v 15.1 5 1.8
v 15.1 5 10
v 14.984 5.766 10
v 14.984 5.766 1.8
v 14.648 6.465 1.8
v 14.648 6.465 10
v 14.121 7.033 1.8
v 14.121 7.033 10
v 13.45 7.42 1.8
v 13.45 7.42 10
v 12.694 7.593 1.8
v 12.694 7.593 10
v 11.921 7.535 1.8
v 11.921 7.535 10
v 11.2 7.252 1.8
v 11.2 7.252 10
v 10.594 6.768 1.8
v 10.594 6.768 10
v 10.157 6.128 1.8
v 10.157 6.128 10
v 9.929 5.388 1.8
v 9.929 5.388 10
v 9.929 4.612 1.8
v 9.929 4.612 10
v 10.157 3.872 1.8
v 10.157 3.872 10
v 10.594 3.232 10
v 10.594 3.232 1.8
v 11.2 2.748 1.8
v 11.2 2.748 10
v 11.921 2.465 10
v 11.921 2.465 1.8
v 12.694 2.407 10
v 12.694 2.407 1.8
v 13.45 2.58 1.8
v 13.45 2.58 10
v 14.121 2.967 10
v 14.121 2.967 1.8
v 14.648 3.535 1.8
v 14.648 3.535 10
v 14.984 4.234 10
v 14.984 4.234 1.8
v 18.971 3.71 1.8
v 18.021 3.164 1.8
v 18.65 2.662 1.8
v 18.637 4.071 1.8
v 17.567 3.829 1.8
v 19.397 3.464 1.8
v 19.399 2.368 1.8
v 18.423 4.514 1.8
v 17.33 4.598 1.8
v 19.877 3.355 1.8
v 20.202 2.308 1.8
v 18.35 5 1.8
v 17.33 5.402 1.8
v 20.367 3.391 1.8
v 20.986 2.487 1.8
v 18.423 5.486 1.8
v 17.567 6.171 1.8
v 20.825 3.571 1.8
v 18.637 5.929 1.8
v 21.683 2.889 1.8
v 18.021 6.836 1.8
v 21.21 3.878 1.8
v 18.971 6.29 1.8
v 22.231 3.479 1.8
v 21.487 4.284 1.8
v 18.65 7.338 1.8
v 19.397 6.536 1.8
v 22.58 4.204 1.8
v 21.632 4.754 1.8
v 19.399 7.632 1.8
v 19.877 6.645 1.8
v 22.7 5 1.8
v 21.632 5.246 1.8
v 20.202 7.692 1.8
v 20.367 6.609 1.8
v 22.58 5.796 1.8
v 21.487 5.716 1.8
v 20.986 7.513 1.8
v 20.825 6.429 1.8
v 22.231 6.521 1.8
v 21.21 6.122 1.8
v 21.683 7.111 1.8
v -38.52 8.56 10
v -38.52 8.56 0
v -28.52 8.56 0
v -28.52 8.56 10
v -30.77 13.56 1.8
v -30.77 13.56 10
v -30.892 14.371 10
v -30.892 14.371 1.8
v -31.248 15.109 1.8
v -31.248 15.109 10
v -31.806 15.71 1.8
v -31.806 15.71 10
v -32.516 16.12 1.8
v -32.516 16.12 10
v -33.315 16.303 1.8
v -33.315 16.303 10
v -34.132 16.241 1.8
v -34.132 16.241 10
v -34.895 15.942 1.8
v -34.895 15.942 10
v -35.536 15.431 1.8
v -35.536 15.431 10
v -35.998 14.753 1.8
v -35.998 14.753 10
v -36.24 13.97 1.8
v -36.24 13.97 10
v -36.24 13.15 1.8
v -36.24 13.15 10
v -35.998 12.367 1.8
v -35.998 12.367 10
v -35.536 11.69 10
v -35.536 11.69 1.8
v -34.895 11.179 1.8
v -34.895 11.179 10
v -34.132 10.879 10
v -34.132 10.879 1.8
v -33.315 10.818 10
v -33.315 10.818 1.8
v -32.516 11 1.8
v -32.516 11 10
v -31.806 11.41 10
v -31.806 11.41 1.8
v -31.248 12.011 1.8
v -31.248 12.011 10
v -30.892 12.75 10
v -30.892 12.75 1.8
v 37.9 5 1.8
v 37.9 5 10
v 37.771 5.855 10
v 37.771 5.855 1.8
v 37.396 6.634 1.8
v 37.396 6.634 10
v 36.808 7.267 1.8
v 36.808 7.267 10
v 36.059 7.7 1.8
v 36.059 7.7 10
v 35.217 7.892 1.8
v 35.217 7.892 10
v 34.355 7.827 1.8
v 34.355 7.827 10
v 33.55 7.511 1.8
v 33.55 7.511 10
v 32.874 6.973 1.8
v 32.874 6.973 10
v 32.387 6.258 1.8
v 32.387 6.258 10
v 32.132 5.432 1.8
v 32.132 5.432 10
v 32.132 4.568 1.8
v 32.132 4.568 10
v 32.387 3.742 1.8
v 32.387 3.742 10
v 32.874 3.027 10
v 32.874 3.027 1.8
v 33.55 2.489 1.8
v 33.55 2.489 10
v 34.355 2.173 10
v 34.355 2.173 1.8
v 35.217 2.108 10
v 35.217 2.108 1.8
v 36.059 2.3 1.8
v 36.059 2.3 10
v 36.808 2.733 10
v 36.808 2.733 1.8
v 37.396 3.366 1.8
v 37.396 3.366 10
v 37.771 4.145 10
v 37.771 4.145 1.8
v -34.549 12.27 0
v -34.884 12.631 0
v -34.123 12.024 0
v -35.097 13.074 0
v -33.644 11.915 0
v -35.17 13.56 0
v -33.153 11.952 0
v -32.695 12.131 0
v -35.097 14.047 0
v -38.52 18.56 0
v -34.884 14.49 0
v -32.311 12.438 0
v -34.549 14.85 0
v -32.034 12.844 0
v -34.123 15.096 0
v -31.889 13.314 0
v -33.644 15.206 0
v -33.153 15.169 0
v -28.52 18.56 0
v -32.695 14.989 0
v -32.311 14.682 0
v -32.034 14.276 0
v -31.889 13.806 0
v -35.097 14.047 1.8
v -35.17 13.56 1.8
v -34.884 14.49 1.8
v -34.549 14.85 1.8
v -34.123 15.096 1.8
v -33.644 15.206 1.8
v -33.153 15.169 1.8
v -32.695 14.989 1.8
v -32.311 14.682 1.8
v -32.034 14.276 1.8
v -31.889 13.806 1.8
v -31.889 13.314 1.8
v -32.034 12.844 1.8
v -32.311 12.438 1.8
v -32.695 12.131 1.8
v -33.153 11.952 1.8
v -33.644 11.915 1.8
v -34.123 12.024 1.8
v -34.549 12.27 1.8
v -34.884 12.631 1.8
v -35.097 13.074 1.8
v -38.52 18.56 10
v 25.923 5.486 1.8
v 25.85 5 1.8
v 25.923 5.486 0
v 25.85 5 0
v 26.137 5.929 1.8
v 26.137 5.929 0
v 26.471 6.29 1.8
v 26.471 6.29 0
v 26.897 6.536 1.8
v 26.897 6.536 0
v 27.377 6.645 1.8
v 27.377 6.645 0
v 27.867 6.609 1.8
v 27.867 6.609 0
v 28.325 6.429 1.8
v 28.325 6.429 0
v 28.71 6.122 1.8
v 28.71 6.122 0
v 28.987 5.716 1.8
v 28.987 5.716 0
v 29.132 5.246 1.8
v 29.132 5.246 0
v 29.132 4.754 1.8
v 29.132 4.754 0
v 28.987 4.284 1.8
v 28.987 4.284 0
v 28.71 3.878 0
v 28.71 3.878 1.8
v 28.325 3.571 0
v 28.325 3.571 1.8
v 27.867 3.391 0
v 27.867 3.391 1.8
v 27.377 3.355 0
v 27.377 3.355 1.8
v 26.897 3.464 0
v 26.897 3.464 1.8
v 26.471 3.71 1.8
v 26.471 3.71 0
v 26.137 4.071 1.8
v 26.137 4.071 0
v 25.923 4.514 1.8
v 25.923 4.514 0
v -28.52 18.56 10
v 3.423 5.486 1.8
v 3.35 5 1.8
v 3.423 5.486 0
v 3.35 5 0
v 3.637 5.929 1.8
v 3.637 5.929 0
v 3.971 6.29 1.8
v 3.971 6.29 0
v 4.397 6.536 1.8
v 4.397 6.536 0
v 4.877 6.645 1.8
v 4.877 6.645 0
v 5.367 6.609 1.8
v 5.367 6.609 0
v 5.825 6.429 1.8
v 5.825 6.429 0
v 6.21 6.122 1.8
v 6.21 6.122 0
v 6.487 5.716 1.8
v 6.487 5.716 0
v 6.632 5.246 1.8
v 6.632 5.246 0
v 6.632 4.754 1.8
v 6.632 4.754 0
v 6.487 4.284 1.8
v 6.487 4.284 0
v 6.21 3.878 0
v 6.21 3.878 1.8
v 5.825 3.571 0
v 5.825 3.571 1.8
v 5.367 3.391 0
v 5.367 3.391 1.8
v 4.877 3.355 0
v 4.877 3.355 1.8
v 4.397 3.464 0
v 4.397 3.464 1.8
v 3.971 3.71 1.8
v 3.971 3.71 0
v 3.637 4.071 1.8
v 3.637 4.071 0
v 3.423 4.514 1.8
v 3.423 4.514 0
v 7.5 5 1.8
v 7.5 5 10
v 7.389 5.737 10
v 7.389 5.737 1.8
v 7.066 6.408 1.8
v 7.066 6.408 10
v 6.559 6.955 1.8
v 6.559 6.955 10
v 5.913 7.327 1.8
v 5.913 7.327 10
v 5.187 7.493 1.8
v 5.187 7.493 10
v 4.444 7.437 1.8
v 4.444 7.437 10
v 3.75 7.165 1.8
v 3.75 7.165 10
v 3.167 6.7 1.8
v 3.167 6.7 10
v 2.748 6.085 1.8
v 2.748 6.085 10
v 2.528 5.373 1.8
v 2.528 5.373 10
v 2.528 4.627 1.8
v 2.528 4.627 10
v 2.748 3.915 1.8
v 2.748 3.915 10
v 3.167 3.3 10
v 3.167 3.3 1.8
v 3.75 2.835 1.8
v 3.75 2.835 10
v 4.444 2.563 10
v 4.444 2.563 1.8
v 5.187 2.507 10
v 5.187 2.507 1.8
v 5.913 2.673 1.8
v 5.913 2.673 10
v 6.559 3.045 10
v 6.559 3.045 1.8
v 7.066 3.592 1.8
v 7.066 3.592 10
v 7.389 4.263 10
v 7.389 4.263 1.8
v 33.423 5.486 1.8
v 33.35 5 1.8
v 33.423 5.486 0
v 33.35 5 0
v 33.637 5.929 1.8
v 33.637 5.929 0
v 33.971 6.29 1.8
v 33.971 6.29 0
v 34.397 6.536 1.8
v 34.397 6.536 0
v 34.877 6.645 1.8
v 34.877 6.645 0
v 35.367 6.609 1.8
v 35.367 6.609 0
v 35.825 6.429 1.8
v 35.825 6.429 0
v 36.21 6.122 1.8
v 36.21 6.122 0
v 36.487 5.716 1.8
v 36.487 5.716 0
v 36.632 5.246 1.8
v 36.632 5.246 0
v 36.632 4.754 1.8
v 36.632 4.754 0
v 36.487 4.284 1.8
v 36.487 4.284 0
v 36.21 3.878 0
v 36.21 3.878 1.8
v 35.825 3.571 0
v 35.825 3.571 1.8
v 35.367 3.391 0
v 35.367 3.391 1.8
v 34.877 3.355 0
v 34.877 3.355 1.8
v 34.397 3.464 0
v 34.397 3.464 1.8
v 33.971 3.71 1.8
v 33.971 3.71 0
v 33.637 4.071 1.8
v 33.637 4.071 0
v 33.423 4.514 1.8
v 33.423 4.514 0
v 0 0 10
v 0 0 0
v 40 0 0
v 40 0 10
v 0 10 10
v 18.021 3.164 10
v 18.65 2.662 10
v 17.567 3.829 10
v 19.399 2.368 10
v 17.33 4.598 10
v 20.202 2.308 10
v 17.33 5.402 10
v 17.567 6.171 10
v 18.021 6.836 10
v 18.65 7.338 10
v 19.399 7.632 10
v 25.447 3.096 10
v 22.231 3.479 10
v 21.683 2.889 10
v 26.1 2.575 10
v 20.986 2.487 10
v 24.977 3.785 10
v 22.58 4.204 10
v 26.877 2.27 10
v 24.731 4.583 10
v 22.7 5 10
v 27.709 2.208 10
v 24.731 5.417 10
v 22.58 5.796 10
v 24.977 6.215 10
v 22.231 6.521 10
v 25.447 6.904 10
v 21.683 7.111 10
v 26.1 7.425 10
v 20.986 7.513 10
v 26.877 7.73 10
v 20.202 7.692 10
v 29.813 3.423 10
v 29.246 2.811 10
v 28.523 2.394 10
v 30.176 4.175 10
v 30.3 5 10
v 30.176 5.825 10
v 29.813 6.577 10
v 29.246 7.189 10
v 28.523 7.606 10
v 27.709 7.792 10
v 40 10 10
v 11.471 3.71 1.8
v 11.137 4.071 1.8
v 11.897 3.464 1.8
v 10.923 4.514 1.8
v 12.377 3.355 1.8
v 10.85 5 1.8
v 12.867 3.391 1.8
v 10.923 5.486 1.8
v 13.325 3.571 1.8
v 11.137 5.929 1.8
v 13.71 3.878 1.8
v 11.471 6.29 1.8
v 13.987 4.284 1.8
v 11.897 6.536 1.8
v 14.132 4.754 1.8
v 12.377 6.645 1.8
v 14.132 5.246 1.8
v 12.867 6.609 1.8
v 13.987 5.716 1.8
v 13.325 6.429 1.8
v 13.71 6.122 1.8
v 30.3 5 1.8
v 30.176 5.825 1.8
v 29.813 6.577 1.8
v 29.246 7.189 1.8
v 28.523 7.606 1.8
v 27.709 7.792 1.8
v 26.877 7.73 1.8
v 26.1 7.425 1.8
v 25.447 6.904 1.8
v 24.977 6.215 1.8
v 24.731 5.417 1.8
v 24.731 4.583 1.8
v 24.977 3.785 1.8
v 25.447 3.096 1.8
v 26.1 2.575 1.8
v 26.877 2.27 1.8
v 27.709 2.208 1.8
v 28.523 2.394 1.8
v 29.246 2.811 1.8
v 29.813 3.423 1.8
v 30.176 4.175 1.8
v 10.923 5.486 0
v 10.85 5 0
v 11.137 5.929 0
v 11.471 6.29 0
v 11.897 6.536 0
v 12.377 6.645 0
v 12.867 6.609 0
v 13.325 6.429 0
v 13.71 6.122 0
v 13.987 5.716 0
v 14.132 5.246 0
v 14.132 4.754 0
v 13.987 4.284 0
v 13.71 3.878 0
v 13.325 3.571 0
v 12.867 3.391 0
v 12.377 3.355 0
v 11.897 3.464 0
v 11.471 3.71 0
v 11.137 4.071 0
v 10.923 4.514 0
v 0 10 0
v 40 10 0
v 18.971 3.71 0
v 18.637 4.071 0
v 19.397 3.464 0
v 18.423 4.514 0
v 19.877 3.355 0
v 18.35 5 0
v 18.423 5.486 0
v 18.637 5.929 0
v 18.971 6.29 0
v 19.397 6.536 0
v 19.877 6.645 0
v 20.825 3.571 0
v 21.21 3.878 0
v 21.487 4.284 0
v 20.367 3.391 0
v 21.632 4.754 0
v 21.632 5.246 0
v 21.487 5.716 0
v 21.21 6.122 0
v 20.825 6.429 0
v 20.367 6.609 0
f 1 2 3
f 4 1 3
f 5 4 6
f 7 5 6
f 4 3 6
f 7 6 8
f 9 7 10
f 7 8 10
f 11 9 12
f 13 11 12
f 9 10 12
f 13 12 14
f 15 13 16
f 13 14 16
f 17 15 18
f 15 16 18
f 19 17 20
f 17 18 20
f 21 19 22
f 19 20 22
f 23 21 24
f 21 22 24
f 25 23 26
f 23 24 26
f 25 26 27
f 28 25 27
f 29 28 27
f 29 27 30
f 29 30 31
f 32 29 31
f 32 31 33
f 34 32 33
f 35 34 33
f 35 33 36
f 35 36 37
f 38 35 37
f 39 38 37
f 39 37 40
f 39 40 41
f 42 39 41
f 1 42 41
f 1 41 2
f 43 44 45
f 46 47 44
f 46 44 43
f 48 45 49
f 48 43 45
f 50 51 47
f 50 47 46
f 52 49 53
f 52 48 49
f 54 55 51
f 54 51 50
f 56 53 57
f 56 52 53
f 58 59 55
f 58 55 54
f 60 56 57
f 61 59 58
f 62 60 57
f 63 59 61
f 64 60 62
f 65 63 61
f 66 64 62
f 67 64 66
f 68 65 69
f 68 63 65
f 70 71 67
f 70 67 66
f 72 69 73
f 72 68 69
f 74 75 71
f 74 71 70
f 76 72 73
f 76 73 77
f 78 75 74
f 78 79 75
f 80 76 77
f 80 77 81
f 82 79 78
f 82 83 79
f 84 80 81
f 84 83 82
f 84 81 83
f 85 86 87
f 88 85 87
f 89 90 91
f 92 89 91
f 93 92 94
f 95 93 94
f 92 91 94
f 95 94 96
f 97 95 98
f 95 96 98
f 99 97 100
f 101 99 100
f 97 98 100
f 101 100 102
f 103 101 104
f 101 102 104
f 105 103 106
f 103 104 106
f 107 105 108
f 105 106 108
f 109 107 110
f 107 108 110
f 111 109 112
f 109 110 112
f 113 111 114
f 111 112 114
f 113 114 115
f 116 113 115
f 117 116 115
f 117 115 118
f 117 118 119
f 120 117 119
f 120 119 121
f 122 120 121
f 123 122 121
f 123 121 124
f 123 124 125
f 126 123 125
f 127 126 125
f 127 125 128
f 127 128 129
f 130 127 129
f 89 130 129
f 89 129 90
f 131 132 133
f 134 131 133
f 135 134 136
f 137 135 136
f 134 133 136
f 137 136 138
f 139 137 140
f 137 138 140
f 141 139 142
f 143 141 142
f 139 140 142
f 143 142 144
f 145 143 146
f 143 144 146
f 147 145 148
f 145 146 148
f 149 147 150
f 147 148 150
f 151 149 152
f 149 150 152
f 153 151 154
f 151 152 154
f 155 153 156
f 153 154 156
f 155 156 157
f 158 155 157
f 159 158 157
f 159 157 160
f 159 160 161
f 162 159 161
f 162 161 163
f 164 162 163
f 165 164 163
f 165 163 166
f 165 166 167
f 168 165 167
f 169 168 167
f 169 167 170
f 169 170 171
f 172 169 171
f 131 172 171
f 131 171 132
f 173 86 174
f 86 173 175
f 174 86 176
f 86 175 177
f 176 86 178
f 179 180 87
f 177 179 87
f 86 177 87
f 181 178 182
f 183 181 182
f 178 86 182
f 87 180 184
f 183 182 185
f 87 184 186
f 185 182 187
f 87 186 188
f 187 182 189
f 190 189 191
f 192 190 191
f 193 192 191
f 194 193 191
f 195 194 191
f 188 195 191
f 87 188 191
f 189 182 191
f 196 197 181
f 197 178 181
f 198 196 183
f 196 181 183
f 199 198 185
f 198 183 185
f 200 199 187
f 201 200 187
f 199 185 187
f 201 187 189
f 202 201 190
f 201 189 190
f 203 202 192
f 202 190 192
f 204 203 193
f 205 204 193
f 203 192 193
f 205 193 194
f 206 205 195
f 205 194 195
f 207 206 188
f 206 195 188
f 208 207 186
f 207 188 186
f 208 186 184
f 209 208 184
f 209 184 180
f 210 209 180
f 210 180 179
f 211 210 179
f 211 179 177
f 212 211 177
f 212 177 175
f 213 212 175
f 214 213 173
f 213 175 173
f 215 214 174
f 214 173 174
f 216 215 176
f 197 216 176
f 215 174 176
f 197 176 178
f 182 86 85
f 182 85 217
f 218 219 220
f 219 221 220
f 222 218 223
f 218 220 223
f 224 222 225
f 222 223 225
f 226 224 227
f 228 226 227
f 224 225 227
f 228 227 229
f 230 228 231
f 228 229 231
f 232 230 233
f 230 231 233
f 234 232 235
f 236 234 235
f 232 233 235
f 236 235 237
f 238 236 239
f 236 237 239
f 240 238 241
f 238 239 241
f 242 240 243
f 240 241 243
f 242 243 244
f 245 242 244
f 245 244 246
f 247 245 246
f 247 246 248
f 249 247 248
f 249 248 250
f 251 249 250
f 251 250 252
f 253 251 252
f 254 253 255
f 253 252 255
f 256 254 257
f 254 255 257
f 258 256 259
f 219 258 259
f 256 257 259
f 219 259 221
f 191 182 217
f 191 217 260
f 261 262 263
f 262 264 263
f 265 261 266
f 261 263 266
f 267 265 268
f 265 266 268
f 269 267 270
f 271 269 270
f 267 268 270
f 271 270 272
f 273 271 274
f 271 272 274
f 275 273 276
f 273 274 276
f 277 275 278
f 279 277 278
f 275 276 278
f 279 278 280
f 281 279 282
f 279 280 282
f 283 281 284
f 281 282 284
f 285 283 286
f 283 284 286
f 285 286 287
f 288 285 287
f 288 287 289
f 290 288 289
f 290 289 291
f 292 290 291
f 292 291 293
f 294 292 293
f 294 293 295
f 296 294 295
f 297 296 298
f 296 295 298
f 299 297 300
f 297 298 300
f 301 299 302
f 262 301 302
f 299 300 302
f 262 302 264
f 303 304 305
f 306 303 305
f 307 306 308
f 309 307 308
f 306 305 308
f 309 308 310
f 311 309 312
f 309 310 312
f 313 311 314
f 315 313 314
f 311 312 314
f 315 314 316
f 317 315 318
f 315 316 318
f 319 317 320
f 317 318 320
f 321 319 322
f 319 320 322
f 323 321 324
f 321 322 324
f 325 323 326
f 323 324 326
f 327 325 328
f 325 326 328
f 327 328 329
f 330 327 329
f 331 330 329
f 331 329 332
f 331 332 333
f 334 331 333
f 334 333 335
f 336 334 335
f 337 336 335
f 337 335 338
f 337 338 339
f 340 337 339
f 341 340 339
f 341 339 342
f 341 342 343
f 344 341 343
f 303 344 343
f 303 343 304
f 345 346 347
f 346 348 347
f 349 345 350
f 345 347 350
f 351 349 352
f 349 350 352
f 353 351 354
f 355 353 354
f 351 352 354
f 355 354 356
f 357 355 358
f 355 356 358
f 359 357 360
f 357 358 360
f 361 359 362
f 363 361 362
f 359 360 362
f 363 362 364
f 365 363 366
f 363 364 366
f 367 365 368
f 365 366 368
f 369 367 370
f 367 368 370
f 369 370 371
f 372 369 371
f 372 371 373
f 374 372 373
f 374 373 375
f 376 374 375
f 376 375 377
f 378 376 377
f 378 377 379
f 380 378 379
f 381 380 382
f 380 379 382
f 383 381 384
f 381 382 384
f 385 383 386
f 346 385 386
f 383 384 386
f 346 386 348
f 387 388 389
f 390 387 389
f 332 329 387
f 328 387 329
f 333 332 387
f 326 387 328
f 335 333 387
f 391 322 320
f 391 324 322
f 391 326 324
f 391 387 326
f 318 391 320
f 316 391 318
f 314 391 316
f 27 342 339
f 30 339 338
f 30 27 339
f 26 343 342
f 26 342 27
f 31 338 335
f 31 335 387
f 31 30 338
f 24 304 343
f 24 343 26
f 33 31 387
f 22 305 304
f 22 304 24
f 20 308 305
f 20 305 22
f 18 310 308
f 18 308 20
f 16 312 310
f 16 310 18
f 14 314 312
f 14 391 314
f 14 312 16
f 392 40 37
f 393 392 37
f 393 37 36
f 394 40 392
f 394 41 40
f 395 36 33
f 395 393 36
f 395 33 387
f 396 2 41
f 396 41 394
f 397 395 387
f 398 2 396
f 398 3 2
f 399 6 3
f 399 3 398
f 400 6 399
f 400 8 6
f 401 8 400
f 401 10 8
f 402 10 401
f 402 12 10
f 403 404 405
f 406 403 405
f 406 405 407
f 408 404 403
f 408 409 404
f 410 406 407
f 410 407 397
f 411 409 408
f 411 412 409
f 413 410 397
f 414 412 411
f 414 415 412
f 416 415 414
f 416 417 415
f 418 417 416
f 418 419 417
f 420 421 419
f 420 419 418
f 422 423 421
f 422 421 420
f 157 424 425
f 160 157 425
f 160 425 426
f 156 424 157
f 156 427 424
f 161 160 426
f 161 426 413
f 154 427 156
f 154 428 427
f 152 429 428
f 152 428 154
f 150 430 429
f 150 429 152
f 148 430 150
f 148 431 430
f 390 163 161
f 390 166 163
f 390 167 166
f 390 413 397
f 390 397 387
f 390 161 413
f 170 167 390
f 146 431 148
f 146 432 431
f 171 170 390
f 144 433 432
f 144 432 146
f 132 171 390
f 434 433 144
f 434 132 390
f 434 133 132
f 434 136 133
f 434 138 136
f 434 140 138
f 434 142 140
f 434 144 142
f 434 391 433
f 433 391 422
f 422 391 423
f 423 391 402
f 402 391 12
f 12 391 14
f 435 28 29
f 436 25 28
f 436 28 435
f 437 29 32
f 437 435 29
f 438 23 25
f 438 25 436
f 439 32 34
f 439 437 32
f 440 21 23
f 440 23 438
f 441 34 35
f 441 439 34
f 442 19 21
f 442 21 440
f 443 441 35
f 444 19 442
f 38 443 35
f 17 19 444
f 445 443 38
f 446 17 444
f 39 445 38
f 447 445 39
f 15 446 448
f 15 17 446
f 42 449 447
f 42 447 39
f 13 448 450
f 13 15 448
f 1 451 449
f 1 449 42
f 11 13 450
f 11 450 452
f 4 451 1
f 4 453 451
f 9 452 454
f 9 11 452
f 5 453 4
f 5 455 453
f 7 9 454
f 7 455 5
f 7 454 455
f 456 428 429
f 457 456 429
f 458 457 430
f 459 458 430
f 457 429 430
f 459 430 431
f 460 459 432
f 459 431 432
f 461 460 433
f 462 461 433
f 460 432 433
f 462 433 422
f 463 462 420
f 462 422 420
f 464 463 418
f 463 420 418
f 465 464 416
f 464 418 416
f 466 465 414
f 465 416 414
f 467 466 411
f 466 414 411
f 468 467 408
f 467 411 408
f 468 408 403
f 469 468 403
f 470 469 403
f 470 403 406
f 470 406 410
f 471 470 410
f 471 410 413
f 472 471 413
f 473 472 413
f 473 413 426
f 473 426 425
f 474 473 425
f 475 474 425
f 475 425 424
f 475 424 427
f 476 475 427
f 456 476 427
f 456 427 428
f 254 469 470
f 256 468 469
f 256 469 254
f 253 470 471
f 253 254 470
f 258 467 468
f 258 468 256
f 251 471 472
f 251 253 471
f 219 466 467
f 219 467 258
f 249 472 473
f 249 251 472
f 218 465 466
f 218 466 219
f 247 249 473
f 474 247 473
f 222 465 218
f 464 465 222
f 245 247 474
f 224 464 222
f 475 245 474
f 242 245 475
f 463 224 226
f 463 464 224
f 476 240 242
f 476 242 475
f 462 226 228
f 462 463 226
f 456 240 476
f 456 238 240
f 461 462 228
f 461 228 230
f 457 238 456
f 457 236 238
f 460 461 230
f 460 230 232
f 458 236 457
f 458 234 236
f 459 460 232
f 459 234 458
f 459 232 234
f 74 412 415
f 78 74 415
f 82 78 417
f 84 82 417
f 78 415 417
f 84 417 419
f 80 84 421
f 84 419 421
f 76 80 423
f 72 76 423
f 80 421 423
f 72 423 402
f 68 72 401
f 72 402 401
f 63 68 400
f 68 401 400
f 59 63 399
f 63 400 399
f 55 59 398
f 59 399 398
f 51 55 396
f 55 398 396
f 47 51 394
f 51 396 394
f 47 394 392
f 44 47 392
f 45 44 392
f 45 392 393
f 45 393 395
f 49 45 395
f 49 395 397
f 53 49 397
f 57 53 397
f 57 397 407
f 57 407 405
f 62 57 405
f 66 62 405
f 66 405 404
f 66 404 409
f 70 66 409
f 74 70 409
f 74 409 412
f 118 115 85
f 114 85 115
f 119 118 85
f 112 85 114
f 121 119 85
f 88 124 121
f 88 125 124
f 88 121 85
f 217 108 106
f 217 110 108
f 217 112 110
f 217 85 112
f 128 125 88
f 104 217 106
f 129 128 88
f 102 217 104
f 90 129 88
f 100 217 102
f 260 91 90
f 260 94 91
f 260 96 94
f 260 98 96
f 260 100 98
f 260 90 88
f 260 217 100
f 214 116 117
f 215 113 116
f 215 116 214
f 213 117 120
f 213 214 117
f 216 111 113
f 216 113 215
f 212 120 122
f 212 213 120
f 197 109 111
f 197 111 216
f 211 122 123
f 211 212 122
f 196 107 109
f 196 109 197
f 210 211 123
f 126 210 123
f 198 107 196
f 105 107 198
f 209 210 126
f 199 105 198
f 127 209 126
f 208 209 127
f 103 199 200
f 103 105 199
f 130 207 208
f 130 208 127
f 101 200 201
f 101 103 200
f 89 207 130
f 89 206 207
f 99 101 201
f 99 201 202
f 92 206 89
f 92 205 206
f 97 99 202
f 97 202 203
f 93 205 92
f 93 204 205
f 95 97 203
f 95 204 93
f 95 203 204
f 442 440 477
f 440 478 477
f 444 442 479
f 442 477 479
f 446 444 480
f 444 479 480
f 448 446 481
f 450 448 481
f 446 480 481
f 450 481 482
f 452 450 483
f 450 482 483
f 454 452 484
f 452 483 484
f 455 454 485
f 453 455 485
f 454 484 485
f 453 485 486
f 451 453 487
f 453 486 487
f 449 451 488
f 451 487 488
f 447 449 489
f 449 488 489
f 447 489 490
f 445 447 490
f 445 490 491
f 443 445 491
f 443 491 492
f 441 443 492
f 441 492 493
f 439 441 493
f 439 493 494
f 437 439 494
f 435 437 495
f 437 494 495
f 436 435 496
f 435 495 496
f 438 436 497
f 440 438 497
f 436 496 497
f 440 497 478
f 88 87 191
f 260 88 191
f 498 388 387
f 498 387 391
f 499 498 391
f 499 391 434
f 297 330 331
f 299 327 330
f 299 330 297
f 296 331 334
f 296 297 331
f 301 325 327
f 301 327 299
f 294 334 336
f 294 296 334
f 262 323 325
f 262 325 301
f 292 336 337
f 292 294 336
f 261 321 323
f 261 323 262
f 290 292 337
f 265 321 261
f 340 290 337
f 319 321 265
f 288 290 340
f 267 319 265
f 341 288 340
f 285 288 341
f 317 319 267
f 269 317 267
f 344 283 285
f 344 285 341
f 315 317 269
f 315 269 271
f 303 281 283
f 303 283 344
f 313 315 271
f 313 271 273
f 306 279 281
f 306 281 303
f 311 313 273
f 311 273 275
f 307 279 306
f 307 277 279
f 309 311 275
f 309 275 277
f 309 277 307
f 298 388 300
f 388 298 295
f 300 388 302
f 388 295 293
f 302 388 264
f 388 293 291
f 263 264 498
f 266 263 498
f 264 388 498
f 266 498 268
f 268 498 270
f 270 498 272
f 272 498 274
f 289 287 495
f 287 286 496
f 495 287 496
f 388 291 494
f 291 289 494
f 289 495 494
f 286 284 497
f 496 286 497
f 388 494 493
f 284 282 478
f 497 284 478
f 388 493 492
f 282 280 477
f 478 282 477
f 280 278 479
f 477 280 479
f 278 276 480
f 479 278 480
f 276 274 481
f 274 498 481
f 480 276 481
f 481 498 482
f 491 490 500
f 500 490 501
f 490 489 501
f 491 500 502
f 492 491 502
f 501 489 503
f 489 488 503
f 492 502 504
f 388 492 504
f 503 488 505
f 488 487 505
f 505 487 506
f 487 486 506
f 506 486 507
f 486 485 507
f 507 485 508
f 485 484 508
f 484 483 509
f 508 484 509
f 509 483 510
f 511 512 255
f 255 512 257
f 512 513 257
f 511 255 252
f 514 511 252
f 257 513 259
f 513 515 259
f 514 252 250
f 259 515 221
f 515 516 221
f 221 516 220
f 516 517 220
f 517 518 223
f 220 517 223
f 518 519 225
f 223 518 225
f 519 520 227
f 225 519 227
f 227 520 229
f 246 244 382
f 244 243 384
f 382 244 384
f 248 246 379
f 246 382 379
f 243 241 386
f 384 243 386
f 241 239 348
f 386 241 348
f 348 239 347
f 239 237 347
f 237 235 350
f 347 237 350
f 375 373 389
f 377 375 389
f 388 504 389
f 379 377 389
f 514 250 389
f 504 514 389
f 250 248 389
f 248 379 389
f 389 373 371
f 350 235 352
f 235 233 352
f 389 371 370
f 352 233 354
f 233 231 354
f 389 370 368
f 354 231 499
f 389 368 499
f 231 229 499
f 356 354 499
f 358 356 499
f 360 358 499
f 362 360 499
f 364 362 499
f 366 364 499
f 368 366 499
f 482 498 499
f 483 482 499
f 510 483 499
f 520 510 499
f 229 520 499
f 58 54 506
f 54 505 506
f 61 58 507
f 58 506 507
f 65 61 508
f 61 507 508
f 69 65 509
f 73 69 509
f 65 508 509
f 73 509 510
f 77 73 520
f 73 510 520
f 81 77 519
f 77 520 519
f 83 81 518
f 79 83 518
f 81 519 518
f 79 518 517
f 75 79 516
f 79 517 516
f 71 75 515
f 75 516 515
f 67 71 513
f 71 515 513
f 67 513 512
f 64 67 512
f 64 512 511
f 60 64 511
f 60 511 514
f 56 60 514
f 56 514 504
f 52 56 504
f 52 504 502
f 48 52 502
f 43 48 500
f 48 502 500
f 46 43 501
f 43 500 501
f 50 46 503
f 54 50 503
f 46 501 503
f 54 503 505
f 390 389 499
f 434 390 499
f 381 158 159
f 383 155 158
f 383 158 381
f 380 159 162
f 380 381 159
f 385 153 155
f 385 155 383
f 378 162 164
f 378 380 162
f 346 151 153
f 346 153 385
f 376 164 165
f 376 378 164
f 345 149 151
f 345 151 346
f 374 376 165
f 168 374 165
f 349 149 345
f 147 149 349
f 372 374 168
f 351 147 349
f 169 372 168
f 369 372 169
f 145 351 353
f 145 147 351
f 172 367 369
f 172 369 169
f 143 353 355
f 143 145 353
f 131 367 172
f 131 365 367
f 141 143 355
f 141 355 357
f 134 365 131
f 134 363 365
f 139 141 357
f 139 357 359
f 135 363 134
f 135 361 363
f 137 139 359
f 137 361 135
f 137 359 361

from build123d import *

# Parameters (mm, degrees)
F0_W            = 40
F0_H            = 10
F1_DEPTH        = 10
F3_D            = 3.3
F3_CBORE_D      = 5
F3_CBORE_DEPTH  = 8.2
F4_D            = 3.3
F4_CBORE_D      = 5.2
F4_CBORE_DEPTH  = 8.2
F5_D            = 3.3
F5_CBORE_D      = 5.4
F5_CBORE_DEPTH  = 8.2
F6_D            = 3.3
F6_CBORE_D      = 5.6
F6_CBORE_DEPTH  = 8.2
F7_D            = 3.3
F7_CBORE_D      = 5.8
F7_CBORE_DEPTH  = 8.2
F8_W            = 10
F8_H            = 10
F9_DEPTH        = 10
F11_D           = 3.3
F11_CBORE_D     = 5.5
F11_CBORE_DEPTH = 8.2


with BuildPart() as f1:
    # F0 (on Top) → F1 (new body)
    with BuildSketch(Plane.XY):
        with Locations((20, 5)):
            Rectangle(F0_W, F0_H)
    extrude(amount=F1_DEPTH)

    # F3 (through all)
    with Locations(Plane.XY.offset(10)):
        with Locations((5, 5)):
            CounterBoreHole(F3_D / 2, F3_CBORE_D / 2, F3_CBORE_DEPTH)

    # F4 (through all)
    with Locations(Plane.XY.offset(10)):
        with Locations((12.5, 5)):
            CounterBoreHole(F4_D / 2, F4_CBORE_D / 2, F4_CBORE_DEPTH)

    # F5 (through all)
    with Locations(Plane.XY.offset(10)):
        with Locations((20, 5)):
            CounterBoreHole(F5_D / 2, F5_CBORE_D / 2, F5_CBORE_DEPTH)

    # F6 (through all)
    with Locations(Plane.XY.offset(10)):
        with Locations((27.5, 5)):
            CounterBoreHole(F6_D / 2, F6_CBORE_D / 2, F6_CBORE_DEPTH)

    # F7 (through all)
    with Locations(Plane.XY.offset(10)):
        with Locations((35, 5)):
            CounterBoreHole(F7_D / 2, F7_CBORE_D / 2, F7_CBORE_DEPTH)


with BuildPart() as f9:
    # F8 (on Top) → F9 (new body)
    with BuildSketch(Plane.XY):
        with Locations((-33.520236, 13.560197)):
            Rectangle(F8_W, F8_H)
    extrude(amount=F9_DEPTH)

    # F11 (through all)
    with Locations(Plane.XY.offset(10)):
        with Locations((-33.520236, 13.560197)):
            CounterBoreHole(F11_D / 2, F11_CBORE_D / 2, F11_CBORE_DEPTH)


solid = Compound([f1.part, f9.part])
